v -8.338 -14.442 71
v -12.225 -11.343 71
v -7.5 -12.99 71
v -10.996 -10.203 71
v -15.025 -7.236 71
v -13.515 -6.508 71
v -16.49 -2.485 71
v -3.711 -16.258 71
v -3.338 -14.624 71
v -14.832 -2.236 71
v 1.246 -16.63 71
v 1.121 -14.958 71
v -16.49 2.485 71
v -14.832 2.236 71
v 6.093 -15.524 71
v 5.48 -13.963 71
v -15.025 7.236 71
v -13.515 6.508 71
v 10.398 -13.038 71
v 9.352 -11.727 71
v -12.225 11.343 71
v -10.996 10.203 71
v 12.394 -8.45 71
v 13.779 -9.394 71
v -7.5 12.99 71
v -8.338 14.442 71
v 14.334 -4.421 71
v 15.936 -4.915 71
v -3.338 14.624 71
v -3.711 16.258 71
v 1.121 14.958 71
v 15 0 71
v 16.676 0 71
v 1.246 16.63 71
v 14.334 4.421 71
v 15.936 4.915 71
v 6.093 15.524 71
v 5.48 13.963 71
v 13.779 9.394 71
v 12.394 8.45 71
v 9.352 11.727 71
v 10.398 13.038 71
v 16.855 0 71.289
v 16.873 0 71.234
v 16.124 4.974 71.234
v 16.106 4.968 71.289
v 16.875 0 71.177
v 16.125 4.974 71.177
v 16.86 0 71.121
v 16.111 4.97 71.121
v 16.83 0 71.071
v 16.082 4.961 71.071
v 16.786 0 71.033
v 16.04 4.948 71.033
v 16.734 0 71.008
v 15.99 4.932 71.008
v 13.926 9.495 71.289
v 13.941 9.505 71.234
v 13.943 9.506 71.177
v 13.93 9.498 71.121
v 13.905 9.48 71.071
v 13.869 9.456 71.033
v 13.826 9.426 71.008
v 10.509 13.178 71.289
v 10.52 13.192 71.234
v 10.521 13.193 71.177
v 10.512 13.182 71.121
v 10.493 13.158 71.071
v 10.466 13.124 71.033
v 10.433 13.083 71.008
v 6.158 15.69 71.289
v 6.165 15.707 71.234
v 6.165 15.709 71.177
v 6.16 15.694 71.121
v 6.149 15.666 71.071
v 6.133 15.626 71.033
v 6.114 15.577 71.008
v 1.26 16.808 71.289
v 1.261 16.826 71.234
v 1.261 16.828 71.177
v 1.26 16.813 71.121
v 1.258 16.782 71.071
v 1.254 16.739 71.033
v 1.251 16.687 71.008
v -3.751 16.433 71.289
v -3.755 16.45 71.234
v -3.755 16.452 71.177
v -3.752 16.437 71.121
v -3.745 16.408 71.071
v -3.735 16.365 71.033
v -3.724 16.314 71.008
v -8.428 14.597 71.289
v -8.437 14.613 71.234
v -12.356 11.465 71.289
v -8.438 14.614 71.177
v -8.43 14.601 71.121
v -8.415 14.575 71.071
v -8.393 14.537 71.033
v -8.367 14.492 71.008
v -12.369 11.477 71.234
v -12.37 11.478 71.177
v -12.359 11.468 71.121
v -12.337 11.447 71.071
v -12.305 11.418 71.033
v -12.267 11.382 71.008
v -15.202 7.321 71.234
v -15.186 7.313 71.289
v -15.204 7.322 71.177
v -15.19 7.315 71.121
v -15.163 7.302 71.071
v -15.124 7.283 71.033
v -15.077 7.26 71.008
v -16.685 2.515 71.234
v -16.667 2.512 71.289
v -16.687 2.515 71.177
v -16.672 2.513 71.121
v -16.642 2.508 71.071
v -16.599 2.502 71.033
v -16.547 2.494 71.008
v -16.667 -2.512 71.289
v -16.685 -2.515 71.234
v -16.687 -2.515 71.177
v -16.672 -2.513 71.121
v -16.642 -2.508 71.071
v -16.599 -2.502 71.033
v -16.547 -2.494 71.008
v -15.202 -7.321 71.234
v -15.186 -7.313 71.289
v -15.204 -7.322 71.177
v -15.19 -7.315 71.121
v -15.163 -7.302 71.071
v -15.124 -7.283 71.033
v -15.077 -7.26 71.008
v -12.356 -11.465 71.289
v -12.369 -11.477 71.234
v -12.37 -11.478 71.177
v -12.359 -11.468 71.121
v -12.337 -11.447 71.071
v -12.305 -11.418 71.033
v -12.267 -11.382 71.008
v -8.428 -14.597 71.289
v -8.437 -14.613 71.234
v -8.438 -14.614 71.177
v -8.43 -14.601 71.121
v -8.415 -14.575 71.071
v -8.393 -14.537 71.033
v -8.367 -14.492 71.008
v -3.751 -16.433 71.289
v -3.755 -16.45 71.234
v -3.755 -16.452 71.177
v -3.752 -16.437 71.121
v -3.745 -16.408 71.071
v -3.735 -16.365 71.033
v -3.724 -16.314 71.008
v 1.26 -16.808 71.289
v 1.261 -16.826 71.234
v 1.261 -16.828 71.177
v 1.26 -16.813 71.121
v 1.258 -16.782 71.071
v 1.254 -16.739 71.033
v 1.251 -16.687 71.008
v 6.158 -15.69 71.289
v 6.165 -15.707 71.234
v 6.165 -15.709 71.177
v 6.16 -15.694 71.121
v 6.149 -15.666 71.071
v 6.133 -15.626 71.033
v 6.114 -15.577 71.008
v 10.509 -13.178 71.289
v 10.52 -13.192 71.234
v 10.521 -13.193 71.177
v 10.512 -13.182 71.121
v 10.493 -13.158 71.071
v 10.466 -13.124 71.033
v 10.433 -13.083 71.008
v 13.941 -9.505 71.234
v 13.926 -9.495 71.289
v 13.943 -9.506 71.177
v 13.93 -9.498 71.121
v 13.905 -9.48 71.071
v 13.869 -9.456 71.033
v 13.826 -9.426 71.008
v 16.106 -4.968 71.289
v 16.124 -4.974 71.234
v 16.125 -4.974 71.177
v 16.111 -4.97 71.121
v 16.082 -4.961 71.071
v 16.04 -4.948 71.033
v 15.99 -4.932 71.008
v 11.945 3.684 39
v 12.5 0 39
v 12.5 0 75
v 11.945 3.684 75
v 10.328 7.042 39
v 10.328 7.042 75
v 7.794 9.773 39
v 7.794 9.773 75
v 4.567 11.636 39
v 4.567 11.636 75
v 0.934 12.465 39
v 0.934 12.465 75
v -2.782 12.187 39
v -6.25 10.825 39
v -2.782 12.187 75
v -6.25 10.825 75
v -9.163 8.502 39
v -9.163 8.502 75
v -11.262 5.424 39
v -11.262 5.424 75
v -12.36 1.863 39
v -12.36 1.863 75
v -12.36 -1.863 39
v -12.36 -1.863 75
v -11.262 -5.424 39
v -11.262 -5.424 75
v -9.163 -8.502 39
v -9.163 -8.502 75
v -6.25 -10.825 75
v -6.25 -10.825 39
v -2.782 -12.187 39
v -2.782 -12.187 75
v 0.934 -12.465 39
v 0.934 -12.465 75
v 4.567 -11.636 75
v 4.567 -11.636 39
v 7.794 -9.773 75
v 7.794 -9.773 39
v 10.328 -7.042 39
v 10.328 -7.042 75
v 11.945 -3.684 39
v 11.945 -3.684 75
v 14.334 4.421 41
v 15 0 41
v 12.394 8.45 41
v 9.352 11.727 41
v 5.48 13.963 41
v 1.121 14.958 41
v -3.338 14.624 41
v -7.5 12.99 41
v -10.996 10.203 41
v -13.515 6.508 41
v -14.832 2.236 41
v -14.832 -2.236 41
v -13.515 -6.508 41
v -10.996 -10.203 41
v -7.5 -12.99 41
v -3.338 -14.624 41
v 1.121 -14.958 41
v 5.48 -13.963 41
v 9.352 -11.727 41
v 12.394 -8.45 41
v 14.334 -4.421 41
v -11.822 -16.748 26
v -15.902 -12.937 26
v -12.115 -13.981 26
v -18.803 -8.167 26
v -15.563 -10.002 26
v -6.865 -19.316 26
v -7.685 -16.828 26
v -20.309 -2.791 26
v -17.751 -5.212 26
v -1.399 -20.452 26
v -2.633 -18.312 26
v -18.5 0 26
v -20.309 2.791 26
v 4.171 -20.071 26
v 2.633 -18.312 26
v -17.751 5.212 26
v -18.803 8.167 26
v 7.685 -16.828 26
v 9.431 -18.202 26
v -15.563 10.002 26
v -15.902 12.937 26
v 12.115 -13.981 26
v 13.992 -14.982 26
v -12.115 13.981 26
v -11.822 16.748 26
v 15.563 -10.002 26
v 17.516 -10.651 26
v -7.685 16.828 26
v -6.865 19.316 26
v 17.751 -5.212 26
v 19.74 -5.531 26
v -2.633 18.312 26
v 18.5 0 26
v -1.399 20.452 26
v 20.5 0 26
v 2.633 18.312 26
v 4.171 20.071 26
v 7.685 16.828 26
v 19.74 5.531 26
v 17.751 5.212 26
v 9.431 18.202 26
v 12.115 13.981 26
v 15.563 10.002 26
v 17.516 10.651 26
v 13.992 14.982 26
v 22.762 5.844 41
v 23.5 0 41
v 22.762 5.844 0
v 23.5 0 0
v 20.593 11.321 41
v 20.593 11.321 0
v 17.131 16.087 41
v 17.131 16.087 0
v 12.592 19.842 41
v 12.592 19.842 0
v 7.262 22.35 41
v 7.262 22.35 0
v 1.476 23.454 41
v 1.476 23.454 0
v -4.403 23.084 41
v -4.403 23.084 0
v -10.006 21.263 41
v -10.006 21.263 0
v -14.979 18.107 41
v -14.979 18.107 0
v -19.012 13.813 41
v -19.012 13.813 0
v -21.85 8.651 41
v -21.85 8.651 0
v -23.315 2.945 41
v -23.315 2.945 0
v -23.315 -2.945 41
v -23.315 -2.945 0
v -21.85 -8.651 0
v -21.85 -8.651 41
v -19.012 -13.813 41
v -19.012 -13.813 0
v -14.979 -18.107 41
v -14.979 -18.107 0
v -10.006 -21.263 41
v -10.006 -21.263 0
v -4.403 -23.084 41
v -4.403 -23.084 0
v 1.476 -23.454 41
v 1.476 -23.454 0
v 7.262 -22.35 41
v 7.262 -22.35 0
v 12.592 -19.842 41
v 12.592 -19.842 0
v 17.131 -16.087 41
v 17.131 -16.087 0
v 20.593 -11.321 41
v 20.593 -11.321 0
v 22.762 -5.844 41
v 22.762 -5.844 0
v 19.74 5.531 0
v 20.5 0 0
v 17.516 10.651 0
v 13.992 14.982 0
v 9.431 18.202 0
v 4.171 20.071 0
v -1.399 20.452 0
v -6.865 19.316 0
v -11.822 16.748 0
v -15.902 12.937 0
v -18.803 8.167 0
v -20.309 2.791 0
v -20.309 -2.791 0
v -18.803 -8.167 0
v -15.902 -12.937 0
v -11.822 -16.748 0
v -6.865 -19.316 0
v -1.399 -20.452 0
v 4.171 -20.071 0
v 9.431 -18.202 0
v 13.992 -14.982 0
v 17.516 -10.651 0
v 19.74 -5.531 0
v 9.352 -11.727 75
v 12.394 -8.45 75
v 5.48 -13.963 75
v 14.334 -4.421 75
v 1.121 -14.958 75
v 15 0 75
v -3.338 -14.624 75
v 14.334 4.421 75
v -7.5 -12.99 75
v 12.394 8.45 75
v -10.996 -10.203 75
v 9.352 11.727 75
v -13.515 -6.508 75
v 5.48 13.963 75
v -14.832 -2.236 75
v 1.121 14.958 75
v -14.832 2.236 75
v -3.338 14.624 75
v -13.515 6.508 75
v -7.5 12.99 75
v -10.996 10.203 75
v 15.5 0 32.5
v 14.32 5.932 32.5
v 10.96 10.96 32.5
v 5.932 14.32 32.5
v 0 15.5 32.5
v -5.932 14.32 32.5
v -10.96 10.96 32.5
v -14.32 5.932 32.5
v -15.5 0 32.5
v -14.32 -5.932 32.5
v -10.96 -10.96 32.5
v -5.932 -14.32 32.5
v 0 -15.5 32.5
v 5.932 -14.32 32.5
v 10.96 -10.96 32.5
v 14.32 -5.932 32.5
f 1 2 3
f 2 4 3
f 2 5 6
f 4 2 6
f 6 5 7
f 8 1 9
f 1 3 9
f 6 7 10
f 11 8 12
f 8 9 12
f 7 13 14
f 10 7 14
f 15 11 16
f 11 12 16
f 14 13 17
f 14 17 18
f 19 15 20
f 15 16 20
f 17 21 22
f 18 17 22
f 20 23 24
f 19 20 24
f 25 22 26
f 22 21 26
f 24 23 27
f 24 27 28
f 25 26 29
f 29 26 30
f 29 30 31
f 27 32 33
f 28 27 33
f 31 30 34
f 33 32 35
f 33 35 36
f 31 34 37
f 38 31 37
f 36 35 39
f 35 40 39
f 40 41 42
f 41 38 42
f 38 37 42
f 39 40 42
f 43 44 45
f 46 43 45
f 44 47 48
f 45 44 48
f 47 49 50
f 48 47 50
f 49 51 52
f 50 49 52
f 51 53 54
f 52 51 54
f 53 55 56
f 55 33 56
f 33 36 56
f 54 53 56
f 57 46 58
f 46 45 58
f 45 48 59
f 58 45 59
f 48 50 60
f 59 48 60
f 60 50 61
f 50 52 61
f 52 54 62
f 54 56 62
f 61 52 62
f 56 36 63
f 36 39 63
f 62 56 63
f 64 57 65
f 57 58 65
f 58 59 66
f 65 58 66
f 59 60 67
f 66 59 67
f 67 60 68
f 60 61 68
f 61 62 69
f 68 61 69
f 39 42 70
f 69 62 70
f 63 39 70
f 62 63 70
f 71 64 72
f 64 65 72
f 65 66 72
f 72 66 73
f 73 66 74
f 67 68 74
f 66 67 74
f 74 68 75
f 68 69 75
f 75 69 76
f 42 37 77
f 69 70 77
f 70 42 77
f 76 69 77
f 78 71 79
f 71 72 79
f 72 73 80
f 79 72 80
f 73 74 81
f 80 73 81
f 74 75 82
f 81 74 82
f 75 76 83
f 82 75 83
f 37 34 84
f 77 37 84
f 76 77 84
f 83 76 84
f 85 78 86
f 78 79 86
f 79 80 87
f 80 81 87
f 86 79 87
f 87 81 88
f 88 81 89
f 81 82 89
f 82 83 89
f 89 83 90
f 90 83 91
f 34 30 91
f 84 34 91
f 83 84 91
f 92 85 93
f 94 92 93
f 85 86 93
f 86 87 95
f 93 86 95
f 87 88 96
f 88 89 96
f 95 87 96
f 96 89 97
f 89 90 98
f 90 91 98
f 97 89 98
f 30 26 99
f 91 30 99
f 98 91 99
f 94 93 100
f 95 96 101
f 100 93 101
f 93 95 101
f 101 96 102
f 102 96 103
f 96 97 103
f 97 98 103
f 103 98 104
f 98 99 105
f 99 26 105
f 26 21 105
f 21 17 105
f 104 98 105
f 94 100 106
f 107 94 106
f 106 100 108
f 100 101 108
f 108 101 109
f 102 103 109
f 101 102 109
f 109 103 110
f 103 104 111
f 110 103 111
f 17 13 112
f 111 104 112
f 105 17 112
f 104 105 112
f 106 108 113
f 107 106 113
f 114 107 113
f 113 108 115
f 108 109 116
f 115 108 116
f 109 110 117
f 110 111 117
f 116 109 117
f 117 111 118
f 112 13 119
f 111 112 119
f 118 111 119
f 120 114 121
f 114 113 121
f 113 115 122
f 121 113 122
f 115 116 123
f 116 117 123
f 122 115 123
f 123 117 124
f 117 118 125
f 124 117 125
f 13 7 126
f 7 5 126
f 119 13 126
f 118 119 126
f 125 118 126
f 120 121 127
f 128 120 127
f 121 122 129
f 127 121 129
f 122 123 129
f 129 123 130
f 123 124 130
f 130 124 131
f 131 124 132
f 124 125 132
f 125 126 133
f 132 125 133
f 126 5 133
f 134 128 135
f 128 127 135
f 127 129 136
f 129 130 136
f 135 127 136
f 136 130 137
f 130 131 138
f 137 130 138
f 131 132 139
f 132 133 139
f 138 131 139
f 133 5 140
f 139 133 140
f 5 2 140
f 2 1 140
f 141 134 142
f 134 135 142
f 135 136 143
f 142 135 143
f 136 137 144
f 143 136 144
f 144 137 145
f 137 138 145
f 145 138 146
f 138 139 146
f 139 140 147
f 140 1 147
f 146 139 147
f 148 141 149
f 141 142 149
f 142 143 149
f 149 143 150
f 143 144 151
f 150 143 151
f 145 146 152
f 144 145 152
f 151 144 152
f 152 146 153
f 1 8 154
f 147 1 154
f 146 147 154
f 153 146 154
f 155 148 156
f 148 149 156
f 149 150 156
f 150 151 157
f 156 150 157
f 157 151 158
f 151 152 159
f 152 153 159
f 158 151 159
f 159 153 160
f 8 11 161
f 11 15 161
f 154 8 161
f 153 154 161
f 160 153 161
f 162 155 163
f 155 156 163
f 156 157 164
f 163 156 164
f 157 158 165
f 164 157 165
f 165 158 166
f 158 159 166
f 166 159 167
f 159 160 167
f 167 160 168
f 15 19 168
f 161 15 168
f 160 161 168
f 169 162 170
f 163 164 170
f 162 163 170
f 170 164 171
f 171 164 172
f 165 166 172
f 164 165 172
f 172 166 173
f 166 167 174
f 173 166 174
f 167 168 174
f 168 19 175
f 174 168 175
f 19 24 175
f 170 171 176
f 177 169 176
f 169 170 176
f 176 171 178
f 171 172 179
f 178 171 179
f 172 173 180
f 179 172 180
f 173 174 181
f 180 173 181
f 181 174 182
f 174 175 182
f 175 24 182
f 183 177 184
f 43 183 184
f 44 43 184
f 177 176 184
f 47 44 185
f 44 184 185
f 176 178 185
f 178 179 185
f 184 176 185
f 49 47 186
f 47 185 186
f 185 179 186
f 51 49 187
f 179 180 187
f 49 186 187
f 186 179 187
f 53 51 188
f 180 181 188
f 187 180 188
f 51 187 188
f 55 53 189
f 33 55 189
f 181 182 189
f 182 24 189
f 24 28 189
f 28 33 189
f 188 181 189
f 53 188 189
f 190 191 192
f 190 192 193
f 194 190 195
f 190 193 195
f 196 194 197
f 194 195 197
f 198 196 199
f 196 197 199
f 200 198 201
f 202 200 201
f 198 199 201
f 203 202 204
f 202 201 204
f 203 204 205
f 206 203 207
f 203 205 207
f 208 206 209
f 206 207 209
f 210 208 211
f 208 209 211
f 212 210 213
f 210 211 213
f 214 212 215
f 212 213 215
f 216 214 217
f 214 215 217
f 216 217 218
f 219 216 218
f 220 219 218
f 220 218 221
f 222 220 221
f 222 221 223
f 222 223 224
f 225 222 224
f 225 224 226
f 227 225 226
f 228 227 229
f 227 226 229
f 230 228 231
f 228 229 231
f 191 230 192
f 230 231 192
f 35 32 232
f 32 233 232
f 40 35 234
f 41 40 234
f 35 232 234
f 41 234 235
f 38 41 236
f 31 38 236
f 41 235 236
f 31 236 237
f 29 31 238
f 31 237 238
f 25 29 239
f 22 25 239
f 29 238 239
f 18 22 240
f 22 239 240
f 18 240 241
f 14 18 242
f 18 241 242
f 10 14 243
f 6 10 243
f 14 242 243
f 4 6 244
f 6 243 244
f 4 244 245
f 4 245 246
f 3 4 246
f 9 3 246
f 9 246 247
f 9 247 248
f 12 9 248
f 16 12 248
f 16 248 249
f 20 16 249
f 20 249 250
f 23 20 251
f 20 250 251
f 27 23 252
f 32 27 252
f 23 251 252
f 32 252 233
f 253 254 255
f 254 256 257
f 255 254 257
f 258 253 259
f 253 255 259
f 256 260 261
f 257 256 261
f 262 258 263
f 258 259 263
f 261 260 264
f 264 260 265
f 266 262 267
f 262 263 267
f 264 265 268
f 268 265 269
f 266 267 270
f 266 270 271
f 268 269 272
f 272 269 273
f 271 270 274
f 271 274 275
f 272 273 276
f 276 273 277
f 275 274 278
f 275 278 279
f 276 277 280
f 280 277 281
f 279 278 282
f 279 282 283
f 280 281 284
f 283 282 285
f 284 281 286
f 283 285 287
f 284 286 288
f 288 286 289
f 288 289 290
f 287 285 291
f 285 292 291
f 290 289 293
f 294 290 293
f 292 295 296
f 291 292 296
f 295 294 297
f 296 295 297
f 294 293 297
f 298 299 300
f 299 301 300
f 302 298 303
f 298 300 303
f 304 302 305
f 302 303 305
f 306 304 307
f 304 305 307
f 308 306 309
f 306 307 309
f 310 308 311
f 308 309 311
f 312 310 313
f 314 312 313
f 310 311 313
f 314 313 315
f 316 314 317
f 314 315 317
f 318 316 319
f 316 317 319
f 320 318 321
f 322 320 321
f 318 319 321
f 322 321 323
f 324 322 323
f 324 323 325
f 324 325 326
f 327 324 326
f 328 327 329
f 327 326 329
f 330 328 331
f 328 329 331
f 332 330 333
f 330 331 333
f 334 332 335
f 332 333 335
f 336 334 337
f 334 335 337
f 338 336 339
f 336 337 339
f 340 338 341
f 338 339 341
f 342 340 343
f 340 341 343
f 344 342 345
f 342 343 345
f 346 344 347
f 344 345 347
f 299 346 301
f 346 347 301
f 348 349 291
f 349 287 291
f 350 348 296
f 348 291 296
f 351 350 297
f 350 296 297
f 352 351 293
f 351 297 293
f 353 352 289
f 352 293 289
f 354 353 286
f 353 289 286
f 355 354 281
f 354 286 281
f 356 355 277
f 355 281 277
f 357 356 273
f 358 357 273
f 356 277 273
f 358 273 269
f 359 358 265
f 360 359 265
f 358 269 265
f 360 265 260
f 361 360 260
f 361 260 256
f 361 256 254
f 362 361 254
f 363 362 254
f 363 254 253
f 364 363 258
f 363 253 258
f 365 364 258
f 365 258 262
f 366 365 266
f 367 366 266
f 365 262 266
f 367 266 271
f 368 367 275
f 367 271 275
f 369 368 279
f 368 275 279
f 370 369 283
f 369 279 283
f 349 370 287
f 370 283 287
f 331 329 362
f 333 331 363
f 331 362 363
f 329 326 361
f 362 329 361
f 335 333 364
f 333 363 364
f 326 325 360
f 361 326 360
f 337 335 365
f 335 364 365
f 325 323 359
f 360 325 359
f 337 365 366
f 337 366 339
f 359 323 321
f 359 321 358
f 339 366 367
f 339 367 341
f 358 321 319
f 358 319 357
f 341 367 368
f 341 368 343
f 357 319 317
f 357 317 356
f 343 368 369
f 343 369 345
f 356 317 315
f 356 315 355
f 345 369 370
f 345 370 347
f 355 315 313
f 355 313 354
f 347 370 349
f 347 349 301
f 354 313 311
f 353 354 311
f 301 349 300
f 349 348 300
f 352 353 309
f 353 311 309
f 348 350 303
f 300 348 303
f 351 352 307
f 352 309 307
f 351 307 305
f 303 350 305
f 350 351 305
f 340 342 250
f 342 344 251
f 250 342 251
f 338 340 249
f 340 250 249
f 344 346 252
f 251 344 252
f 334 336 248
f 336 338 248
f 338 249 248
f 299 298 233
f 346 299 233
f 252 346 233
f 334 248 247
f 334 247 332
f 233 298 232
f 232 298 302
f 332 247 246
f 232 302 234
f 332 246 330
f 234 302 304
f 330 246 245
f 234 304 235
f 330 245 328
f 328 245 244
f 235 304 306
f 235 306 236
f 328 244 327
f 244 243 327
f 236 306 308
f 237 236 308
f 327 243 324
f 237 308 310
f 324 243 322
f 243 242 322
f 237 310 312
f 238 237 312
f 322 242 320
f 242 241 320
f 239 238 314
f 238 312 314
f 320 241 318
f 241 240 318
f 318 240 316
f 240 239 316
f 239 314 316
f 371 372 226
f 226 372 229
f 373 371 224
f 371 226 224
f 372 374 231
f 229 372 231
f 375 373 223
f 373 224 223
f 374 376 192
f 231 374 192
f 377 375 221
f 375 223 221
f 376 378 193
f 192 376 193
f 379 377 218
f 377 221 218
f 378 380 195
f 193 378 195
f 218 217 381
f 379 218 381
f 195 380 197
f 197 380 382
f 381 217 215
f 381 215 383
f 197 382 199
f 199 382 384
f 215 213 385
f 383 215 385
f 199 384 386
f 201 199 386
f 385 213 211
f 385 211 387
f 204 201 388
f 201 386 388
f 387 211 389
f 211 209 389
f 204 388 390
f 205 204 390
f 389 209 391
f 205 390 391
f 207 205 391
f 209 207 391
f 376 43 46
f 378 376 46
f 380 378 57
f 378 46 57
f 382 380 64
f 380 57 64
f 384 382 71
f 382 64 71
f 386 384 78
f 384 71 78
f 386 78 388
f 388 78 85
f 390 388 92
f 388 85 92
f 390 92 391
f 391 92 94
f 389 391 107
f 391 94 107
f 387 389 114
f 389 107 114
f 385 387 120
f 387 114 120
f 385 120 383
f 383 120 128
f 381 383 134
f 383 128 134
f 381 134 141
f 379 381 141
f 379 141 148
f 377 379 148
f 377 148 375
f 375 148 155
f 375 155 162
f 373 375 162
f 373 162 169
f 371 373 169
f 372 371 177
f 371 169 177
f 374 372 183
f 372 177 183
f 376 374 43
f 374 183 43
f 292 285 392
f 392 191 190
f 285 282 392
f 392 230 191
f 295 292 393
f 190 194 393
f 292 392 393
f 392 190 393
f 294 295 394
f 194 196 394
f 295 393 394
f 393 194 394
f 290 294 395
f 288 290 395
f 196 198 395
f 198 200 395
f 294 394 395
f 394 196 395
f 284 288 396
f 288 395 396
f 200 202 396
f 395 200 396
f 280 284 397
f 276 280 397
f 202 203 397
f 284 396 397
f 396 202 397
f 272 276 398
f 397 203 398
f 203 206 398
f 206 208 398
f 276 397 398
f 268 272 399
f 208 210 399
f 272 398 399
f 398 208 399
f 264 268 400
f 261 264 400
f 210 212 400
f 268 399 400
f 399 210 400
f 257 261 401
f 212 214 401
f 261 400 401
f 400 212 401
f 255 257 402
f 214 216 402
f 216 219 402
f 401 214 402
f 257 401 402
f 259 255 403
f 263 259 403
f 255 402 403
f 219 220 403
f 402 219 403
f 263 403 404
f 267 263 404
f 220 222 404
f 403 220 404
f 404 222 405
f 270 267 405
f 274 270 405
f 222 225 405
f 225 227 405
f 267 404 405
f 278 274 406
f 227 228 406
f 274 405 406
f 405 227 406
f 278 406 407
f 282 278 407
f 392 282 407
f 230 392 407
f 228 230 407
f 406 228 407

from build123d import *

# Parameters (mm, degrees)
FILLET_R = 0.2


with BuildPart() as part:
    # Sketch → Revolution (revolve)
    with BuildSketch(Plane.XZ):
        Polygon((15, 75), (17, 71), (15, 71), (15, 41), (23.5, 41), (23.5, 0), (20.5, 0), (20.5, 26), (18.5, 26), (12.5, 39), (12.5, 75), align=None)
    revolve(axis=Axis((0, 0, 0), (0, 0, 1)))

    # Fillet
    fillet_edges = [part.edges().sort_by_distance(p)[0] for p in [
        (-17, 0, 71),
    ]]
    fillet(fillet_edges, radius=FILLET_R)


solid = part.part
